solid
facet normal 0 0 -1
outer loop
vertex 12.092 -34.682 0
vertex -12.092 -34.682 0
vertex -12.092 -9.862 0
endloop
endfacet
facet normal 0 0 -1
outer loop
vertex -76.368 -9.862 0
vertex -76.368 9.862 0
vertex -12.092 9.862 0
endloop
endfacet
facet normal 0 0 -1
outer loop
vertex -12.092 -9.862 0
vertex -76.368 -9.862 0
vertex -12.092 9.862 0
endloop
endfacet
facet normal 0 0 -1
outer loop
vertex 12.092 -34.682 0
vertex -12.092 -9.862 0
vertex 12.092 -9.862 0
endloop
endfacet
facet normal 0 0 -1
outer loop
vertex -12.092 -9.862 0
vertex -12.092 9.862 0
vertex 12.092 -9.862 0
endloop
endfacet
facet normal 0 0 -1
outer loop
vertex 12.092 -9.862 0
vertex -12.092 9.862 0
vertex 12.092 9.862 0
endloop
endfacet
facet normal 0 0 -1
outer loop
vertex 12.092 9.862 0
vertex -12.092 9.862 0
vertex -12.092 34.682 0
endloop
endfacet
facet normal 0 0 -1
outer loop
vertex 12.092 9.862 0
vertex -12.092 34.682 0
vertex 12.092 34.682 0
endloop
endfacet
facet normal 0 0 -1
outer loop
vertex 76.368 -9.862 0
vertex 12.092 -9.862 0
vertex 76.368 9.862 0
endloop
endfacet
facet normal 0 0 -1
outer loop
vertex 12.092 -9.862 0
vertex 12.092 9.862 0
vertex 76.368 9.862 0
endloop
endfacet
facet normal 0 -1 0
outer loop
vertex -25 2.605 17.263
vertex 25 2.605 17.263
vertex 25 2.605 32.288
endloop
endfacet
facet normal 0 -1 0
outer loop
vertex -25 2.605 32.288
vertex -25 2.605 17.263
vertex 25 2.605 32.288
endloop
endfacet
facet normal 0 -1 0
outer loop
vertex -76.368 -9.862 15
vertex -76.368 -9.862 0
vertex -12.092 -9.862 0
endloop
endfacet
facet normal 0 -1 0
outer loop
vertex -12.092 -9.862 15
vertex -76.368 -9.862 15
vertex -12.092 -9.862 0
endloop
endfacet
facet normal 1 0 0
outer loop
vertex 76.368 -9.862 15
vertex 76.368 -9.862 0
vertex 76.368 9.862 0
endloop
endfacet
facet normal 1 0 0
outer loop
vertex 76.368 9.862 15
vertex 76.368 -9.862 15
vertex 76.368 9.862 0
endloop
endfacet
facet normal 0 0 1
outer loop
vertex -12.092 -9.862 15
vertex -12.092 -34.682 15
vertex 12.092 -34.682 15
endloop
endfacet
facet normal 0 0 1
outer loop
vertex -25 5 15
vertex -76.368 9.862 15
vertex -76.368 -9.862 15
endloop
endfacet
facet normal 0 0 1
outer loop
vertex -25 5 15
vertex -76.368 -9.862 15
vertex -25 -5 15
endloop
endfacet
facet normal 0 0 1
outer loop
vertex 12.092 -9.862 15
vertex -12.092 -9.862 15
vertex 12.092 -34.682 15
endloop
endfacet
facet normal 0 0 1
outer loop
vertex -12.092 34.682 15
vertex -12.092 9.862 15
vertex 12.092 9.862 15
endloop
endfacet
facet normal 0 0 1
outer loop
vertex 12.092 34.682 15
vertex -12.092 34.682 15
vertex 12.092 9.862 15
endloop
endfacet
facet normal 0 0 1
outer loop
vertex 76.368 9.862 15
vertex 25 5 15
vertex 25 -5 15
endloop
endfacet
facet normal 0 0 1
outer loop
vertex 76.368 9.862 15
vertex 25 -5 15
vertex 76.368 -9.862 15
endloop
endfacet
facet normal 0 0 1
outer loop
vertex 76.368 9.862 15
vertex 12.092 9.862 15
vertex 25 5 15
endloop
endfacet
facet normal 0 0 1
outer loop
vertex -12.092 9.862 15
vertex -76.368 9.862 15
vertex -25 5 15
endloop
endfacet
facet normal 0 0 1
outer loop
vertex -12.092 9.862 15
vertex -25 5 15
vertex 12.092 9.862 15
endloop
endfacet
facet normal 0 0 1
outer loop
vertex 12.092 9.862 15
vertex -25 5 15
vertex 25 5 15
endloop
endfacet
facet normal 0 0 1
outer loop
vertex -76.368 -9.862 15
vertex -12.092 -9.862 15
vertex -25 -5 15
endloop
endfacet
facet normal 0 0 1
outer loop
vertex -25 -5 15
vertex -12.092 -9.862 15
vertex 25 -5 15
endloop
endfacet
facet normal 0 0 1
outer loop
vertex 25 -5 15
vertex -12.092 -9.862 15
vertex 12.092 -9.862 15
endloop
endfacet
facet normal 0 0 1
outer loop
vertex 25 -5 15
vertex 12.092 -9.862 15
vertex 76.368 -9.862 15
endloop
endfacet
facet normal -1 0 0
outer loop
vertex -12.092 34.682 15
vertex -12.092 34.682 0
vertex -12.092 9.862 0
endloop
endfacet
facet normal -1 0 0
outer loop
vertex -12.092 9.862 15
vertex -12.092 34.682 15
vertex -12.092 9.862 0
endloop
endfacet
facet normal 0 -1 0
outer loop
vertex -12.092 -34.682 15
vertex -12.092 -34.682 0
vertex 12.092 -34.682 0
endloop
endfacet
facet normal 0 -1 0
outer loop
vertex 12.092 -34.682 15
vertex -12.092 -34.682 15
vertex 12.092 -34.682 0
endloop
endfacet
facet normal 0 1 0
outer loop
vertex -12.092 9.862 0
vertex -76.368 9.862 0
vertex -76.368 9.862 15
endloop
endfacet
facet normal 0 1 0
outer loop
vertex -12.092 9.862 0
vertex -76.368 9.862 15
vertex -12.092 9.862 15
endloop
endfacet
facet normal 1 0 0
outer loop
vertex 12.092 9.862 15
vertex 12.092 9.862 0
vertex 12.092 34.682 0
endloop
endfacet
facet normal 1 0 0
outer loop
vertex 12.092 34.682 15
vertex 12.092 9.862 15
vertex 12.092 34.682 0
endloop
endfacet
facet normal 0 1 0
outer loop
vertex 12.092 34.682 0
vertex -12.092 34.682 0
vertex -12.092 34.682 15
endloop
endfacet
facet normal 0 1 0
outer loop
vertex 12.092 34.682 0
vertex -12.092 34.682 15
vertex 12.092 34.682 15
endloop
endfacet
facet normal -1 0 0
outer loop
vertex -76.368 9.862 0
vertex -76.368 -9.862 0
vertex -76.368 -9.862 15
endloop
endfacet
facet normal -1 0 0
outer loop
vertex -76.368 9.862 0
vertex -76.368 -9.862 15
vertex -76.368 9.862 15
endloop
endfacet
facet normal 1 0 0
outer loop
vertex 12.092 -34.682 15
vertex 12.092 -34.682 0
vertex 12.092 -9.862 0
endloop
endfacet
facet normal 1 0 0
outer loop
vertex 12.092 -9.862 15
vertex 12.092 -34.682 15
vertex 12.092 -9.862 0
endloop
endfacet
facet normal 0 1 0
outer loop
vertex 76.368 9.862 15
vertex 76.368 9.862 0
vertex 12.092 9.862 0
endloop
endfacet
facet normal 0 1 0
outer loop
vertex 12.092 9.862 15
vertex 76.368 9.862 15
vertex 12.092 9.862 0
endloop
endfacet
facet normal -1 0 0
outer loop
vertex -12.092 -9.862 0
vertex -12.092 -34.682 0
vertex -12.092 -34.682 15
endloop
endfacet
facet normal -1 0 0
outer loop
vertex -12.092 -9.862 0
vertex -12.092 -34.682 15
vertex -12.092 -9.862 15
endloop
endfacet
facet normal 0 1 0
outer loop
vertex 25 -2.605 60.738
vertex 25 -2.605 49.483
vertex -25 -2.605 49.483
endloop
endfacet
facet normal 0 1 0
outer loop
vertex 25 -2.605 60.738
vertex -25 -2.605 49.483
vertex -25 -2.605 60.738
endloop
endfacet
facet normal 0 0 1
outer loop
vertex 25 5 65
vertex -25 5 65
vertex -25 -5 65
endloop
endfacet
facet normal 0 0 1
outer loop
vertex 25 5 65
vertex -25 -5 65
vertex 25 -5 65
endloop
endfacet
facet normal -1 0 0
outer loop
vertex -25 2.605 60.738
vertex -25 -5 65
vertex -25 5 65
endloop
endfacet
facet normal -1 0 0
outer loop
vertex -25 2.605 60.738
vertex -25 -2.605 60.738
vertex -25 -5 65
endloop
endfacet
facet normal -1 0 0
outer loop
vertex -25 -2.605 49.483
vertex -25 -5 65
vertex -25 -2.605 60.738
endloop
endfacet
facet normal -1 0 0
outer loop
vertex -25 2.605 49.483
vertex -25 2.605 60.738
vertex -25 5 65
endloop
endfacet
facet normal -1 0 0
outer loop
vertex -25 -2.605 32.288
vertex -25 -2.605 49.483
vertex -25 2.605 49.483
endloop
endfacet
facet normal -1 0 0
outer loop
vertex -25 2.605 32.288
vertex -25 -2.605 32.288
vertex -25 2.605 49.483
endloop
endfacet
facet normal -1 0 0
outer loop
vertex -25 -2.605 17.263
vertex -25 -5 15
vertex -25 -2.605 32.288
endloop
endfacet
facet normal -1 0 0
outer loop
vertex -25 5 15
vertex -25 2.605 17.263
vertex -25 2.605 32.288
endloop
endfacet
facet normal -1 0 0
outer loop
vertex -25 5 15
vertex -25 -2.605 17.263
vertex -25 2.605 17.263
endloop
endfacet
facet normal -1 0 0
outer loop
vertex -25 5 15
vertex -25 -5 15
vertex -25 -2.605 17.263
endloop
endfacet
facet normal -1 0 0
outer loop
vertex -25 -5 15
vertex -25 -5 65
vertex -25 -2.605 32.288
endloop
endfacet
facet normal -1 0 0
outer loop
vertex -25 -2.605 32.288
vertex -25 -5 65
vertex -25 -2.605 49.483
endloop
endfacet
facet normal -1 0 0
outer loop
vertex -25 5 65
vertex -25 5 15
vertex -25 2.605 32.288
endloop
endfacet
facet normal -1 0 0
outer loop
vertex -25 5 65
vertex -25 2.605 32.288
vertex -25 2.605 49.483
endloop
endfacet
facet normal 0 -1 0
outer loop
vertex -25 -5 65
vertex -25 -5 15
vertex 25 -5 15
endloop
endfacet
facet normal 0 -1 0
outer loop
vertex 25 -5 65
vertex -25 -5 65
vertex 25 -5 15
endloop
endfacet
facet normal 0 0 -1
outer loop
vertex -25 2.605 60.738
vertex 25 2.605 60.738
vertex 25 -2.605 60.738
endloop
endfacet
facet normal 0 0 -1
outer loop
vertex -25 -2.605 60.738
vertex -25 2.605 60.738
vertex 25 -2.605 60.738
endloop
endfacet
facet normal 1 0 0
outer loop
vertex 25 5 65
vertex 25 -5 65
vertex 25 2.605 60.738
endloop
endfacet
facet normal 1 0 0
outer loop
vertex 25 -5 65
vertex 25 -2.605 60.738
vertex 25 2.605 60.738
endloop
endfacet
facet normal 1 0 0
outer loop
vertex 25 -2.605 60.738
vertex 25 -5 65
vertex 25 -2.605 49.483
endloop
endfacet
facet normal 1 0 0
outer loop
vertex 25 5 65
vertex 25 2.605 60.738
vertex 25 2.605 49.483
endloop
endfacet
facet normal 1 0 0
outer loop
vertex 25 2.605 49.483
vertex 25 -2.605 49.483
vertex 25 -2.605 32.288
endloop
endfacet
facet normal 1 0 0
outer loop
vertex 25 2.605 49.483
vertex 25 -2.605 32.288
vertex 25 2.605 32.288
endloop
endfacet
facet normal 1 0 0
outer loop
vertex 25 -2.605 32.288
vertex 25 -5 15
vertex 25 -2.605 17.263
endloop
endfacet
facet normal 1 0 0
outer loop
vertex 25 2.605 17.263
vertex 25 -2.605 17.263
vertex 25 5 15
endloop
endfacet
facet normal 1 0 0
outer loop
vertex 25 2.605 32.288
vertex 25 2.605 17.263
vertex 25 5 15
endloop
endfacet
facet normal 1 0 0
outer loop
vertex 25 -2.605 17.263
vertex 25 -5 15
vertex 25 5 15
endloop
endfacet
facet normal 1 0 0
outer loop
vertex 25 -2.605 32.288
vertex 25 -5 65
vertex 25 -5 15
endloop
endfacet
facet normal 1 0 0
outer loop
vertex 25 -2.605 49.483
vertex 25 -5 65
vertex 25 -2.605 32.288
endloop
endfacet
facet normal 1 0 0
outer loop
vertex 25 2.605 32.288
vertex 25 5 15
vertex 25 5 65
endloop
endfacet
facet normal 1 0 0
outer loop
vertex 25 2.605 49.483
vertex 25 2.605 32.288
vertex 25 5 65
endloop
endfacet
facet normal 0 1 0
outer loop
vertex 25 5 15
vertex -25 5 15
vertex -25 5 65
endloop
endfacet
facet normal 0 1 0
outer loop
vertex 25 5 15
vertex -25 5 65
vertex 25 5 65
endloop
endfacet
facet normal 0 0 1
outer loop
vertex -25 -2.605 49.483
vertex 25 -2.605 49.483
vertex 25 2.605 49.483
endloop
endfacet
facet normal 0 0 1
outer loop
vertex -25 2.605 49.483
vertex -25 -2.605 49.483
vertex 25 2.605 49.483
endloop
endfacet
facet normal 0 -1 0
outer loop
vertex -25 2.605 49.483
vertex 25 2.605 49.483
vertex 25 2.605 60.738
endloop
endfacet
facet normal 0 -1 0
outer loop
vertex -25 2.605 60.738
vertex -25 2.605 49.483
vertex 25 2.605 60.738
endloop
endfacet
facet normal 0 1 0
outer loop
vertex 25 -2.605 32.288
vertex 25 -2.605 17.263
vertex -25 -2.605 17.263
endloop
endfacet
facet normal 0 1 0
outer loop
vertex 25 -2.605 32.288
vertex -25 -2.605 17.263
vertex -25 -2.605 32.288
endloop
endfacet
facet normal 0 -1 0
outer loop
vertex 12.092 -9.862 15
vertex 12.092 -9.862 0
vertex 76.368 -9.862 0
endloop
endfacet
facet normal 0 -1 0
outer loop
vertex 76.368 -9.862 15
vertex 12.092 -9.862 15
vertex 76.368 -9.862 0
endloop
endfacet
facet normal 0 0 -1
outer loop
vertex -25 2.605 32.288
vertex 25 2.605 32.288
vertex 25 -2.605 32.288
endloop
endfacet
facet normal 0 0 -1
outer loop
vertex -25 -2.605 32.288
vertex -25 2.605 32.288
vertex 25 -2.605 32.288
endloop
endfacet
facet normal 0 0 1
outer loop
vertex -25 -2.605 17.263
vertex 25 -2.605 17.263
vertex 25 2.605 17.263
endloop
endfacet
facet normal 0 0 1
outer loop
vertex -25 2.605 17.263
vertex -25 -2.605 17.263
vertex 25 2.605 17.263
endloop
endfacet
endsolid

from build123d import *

# Parameters (mm, degrees)
F0_W     = 64.2762212083
F0_H     = 19.7247266769
F0_W_2   = 24.1831187159
F0_H_2   = 24.8195268214
F1_DEPTH = 15
F2_W     = 50
F2_H     = 10
F3_DEPTH = 50
F4_W     = 2.6052840985
F4_H     = 15.0249563158
F4_W_2   = 2.6046917774
F4_H_2   = 11.2548321486
F5_DEPTH = 100


with BuildPart() as f1:
    # F0 (on Top) → F1 (new body)
    with BuildSketch(Plane.XY):
        with Locations((44.2296699621, 0)):
            Rectangle(F0_W, F0_H)
        Rectangle(F0_W_2, F0_H)
        with Locations((0, 22.2721267492)):
            Rectangle(F0_W_2, F0_H_2)
        with Locations((-44.2296699621, 0)):
            Rectangle(F0_W, F0_H)
        with Locations((0, -22.2721267492)):
            Rectangle(F0_W_2, F0_H_2)
    extrude(amount=F1_DEPTH)

    # F2 (on face) → F3 (join)
    with BuildSketch(Plane.XY.offset(15)):
        Rectangle(F2_W, F2_H)
    extrude(amount=F3_DEPTH)

    # F4 (on face) → F5 (cut)
    with BuildSketch(Plane.YZ.offset(25)):
        with Locations((1.3026420493, 24.7752834111)):
            Rectangle(F4_W, F4_H)
        with Locations((-1.3026420493, 24.7752834111)):
            Rectangle(F4_W, F4_H)
        with Locations((-1.3023458887, 55.1106519997)):
            Rectangle(F4_W_2, F4_H_2)
        with Locations((1.3023458887, 55.1106519997)):
            Rectangle(F4_W_2, F4_H_2)
    extrude(amount=-F5_DEPTH, mode=Mode.SUBTRACT)


solid = f1.part
